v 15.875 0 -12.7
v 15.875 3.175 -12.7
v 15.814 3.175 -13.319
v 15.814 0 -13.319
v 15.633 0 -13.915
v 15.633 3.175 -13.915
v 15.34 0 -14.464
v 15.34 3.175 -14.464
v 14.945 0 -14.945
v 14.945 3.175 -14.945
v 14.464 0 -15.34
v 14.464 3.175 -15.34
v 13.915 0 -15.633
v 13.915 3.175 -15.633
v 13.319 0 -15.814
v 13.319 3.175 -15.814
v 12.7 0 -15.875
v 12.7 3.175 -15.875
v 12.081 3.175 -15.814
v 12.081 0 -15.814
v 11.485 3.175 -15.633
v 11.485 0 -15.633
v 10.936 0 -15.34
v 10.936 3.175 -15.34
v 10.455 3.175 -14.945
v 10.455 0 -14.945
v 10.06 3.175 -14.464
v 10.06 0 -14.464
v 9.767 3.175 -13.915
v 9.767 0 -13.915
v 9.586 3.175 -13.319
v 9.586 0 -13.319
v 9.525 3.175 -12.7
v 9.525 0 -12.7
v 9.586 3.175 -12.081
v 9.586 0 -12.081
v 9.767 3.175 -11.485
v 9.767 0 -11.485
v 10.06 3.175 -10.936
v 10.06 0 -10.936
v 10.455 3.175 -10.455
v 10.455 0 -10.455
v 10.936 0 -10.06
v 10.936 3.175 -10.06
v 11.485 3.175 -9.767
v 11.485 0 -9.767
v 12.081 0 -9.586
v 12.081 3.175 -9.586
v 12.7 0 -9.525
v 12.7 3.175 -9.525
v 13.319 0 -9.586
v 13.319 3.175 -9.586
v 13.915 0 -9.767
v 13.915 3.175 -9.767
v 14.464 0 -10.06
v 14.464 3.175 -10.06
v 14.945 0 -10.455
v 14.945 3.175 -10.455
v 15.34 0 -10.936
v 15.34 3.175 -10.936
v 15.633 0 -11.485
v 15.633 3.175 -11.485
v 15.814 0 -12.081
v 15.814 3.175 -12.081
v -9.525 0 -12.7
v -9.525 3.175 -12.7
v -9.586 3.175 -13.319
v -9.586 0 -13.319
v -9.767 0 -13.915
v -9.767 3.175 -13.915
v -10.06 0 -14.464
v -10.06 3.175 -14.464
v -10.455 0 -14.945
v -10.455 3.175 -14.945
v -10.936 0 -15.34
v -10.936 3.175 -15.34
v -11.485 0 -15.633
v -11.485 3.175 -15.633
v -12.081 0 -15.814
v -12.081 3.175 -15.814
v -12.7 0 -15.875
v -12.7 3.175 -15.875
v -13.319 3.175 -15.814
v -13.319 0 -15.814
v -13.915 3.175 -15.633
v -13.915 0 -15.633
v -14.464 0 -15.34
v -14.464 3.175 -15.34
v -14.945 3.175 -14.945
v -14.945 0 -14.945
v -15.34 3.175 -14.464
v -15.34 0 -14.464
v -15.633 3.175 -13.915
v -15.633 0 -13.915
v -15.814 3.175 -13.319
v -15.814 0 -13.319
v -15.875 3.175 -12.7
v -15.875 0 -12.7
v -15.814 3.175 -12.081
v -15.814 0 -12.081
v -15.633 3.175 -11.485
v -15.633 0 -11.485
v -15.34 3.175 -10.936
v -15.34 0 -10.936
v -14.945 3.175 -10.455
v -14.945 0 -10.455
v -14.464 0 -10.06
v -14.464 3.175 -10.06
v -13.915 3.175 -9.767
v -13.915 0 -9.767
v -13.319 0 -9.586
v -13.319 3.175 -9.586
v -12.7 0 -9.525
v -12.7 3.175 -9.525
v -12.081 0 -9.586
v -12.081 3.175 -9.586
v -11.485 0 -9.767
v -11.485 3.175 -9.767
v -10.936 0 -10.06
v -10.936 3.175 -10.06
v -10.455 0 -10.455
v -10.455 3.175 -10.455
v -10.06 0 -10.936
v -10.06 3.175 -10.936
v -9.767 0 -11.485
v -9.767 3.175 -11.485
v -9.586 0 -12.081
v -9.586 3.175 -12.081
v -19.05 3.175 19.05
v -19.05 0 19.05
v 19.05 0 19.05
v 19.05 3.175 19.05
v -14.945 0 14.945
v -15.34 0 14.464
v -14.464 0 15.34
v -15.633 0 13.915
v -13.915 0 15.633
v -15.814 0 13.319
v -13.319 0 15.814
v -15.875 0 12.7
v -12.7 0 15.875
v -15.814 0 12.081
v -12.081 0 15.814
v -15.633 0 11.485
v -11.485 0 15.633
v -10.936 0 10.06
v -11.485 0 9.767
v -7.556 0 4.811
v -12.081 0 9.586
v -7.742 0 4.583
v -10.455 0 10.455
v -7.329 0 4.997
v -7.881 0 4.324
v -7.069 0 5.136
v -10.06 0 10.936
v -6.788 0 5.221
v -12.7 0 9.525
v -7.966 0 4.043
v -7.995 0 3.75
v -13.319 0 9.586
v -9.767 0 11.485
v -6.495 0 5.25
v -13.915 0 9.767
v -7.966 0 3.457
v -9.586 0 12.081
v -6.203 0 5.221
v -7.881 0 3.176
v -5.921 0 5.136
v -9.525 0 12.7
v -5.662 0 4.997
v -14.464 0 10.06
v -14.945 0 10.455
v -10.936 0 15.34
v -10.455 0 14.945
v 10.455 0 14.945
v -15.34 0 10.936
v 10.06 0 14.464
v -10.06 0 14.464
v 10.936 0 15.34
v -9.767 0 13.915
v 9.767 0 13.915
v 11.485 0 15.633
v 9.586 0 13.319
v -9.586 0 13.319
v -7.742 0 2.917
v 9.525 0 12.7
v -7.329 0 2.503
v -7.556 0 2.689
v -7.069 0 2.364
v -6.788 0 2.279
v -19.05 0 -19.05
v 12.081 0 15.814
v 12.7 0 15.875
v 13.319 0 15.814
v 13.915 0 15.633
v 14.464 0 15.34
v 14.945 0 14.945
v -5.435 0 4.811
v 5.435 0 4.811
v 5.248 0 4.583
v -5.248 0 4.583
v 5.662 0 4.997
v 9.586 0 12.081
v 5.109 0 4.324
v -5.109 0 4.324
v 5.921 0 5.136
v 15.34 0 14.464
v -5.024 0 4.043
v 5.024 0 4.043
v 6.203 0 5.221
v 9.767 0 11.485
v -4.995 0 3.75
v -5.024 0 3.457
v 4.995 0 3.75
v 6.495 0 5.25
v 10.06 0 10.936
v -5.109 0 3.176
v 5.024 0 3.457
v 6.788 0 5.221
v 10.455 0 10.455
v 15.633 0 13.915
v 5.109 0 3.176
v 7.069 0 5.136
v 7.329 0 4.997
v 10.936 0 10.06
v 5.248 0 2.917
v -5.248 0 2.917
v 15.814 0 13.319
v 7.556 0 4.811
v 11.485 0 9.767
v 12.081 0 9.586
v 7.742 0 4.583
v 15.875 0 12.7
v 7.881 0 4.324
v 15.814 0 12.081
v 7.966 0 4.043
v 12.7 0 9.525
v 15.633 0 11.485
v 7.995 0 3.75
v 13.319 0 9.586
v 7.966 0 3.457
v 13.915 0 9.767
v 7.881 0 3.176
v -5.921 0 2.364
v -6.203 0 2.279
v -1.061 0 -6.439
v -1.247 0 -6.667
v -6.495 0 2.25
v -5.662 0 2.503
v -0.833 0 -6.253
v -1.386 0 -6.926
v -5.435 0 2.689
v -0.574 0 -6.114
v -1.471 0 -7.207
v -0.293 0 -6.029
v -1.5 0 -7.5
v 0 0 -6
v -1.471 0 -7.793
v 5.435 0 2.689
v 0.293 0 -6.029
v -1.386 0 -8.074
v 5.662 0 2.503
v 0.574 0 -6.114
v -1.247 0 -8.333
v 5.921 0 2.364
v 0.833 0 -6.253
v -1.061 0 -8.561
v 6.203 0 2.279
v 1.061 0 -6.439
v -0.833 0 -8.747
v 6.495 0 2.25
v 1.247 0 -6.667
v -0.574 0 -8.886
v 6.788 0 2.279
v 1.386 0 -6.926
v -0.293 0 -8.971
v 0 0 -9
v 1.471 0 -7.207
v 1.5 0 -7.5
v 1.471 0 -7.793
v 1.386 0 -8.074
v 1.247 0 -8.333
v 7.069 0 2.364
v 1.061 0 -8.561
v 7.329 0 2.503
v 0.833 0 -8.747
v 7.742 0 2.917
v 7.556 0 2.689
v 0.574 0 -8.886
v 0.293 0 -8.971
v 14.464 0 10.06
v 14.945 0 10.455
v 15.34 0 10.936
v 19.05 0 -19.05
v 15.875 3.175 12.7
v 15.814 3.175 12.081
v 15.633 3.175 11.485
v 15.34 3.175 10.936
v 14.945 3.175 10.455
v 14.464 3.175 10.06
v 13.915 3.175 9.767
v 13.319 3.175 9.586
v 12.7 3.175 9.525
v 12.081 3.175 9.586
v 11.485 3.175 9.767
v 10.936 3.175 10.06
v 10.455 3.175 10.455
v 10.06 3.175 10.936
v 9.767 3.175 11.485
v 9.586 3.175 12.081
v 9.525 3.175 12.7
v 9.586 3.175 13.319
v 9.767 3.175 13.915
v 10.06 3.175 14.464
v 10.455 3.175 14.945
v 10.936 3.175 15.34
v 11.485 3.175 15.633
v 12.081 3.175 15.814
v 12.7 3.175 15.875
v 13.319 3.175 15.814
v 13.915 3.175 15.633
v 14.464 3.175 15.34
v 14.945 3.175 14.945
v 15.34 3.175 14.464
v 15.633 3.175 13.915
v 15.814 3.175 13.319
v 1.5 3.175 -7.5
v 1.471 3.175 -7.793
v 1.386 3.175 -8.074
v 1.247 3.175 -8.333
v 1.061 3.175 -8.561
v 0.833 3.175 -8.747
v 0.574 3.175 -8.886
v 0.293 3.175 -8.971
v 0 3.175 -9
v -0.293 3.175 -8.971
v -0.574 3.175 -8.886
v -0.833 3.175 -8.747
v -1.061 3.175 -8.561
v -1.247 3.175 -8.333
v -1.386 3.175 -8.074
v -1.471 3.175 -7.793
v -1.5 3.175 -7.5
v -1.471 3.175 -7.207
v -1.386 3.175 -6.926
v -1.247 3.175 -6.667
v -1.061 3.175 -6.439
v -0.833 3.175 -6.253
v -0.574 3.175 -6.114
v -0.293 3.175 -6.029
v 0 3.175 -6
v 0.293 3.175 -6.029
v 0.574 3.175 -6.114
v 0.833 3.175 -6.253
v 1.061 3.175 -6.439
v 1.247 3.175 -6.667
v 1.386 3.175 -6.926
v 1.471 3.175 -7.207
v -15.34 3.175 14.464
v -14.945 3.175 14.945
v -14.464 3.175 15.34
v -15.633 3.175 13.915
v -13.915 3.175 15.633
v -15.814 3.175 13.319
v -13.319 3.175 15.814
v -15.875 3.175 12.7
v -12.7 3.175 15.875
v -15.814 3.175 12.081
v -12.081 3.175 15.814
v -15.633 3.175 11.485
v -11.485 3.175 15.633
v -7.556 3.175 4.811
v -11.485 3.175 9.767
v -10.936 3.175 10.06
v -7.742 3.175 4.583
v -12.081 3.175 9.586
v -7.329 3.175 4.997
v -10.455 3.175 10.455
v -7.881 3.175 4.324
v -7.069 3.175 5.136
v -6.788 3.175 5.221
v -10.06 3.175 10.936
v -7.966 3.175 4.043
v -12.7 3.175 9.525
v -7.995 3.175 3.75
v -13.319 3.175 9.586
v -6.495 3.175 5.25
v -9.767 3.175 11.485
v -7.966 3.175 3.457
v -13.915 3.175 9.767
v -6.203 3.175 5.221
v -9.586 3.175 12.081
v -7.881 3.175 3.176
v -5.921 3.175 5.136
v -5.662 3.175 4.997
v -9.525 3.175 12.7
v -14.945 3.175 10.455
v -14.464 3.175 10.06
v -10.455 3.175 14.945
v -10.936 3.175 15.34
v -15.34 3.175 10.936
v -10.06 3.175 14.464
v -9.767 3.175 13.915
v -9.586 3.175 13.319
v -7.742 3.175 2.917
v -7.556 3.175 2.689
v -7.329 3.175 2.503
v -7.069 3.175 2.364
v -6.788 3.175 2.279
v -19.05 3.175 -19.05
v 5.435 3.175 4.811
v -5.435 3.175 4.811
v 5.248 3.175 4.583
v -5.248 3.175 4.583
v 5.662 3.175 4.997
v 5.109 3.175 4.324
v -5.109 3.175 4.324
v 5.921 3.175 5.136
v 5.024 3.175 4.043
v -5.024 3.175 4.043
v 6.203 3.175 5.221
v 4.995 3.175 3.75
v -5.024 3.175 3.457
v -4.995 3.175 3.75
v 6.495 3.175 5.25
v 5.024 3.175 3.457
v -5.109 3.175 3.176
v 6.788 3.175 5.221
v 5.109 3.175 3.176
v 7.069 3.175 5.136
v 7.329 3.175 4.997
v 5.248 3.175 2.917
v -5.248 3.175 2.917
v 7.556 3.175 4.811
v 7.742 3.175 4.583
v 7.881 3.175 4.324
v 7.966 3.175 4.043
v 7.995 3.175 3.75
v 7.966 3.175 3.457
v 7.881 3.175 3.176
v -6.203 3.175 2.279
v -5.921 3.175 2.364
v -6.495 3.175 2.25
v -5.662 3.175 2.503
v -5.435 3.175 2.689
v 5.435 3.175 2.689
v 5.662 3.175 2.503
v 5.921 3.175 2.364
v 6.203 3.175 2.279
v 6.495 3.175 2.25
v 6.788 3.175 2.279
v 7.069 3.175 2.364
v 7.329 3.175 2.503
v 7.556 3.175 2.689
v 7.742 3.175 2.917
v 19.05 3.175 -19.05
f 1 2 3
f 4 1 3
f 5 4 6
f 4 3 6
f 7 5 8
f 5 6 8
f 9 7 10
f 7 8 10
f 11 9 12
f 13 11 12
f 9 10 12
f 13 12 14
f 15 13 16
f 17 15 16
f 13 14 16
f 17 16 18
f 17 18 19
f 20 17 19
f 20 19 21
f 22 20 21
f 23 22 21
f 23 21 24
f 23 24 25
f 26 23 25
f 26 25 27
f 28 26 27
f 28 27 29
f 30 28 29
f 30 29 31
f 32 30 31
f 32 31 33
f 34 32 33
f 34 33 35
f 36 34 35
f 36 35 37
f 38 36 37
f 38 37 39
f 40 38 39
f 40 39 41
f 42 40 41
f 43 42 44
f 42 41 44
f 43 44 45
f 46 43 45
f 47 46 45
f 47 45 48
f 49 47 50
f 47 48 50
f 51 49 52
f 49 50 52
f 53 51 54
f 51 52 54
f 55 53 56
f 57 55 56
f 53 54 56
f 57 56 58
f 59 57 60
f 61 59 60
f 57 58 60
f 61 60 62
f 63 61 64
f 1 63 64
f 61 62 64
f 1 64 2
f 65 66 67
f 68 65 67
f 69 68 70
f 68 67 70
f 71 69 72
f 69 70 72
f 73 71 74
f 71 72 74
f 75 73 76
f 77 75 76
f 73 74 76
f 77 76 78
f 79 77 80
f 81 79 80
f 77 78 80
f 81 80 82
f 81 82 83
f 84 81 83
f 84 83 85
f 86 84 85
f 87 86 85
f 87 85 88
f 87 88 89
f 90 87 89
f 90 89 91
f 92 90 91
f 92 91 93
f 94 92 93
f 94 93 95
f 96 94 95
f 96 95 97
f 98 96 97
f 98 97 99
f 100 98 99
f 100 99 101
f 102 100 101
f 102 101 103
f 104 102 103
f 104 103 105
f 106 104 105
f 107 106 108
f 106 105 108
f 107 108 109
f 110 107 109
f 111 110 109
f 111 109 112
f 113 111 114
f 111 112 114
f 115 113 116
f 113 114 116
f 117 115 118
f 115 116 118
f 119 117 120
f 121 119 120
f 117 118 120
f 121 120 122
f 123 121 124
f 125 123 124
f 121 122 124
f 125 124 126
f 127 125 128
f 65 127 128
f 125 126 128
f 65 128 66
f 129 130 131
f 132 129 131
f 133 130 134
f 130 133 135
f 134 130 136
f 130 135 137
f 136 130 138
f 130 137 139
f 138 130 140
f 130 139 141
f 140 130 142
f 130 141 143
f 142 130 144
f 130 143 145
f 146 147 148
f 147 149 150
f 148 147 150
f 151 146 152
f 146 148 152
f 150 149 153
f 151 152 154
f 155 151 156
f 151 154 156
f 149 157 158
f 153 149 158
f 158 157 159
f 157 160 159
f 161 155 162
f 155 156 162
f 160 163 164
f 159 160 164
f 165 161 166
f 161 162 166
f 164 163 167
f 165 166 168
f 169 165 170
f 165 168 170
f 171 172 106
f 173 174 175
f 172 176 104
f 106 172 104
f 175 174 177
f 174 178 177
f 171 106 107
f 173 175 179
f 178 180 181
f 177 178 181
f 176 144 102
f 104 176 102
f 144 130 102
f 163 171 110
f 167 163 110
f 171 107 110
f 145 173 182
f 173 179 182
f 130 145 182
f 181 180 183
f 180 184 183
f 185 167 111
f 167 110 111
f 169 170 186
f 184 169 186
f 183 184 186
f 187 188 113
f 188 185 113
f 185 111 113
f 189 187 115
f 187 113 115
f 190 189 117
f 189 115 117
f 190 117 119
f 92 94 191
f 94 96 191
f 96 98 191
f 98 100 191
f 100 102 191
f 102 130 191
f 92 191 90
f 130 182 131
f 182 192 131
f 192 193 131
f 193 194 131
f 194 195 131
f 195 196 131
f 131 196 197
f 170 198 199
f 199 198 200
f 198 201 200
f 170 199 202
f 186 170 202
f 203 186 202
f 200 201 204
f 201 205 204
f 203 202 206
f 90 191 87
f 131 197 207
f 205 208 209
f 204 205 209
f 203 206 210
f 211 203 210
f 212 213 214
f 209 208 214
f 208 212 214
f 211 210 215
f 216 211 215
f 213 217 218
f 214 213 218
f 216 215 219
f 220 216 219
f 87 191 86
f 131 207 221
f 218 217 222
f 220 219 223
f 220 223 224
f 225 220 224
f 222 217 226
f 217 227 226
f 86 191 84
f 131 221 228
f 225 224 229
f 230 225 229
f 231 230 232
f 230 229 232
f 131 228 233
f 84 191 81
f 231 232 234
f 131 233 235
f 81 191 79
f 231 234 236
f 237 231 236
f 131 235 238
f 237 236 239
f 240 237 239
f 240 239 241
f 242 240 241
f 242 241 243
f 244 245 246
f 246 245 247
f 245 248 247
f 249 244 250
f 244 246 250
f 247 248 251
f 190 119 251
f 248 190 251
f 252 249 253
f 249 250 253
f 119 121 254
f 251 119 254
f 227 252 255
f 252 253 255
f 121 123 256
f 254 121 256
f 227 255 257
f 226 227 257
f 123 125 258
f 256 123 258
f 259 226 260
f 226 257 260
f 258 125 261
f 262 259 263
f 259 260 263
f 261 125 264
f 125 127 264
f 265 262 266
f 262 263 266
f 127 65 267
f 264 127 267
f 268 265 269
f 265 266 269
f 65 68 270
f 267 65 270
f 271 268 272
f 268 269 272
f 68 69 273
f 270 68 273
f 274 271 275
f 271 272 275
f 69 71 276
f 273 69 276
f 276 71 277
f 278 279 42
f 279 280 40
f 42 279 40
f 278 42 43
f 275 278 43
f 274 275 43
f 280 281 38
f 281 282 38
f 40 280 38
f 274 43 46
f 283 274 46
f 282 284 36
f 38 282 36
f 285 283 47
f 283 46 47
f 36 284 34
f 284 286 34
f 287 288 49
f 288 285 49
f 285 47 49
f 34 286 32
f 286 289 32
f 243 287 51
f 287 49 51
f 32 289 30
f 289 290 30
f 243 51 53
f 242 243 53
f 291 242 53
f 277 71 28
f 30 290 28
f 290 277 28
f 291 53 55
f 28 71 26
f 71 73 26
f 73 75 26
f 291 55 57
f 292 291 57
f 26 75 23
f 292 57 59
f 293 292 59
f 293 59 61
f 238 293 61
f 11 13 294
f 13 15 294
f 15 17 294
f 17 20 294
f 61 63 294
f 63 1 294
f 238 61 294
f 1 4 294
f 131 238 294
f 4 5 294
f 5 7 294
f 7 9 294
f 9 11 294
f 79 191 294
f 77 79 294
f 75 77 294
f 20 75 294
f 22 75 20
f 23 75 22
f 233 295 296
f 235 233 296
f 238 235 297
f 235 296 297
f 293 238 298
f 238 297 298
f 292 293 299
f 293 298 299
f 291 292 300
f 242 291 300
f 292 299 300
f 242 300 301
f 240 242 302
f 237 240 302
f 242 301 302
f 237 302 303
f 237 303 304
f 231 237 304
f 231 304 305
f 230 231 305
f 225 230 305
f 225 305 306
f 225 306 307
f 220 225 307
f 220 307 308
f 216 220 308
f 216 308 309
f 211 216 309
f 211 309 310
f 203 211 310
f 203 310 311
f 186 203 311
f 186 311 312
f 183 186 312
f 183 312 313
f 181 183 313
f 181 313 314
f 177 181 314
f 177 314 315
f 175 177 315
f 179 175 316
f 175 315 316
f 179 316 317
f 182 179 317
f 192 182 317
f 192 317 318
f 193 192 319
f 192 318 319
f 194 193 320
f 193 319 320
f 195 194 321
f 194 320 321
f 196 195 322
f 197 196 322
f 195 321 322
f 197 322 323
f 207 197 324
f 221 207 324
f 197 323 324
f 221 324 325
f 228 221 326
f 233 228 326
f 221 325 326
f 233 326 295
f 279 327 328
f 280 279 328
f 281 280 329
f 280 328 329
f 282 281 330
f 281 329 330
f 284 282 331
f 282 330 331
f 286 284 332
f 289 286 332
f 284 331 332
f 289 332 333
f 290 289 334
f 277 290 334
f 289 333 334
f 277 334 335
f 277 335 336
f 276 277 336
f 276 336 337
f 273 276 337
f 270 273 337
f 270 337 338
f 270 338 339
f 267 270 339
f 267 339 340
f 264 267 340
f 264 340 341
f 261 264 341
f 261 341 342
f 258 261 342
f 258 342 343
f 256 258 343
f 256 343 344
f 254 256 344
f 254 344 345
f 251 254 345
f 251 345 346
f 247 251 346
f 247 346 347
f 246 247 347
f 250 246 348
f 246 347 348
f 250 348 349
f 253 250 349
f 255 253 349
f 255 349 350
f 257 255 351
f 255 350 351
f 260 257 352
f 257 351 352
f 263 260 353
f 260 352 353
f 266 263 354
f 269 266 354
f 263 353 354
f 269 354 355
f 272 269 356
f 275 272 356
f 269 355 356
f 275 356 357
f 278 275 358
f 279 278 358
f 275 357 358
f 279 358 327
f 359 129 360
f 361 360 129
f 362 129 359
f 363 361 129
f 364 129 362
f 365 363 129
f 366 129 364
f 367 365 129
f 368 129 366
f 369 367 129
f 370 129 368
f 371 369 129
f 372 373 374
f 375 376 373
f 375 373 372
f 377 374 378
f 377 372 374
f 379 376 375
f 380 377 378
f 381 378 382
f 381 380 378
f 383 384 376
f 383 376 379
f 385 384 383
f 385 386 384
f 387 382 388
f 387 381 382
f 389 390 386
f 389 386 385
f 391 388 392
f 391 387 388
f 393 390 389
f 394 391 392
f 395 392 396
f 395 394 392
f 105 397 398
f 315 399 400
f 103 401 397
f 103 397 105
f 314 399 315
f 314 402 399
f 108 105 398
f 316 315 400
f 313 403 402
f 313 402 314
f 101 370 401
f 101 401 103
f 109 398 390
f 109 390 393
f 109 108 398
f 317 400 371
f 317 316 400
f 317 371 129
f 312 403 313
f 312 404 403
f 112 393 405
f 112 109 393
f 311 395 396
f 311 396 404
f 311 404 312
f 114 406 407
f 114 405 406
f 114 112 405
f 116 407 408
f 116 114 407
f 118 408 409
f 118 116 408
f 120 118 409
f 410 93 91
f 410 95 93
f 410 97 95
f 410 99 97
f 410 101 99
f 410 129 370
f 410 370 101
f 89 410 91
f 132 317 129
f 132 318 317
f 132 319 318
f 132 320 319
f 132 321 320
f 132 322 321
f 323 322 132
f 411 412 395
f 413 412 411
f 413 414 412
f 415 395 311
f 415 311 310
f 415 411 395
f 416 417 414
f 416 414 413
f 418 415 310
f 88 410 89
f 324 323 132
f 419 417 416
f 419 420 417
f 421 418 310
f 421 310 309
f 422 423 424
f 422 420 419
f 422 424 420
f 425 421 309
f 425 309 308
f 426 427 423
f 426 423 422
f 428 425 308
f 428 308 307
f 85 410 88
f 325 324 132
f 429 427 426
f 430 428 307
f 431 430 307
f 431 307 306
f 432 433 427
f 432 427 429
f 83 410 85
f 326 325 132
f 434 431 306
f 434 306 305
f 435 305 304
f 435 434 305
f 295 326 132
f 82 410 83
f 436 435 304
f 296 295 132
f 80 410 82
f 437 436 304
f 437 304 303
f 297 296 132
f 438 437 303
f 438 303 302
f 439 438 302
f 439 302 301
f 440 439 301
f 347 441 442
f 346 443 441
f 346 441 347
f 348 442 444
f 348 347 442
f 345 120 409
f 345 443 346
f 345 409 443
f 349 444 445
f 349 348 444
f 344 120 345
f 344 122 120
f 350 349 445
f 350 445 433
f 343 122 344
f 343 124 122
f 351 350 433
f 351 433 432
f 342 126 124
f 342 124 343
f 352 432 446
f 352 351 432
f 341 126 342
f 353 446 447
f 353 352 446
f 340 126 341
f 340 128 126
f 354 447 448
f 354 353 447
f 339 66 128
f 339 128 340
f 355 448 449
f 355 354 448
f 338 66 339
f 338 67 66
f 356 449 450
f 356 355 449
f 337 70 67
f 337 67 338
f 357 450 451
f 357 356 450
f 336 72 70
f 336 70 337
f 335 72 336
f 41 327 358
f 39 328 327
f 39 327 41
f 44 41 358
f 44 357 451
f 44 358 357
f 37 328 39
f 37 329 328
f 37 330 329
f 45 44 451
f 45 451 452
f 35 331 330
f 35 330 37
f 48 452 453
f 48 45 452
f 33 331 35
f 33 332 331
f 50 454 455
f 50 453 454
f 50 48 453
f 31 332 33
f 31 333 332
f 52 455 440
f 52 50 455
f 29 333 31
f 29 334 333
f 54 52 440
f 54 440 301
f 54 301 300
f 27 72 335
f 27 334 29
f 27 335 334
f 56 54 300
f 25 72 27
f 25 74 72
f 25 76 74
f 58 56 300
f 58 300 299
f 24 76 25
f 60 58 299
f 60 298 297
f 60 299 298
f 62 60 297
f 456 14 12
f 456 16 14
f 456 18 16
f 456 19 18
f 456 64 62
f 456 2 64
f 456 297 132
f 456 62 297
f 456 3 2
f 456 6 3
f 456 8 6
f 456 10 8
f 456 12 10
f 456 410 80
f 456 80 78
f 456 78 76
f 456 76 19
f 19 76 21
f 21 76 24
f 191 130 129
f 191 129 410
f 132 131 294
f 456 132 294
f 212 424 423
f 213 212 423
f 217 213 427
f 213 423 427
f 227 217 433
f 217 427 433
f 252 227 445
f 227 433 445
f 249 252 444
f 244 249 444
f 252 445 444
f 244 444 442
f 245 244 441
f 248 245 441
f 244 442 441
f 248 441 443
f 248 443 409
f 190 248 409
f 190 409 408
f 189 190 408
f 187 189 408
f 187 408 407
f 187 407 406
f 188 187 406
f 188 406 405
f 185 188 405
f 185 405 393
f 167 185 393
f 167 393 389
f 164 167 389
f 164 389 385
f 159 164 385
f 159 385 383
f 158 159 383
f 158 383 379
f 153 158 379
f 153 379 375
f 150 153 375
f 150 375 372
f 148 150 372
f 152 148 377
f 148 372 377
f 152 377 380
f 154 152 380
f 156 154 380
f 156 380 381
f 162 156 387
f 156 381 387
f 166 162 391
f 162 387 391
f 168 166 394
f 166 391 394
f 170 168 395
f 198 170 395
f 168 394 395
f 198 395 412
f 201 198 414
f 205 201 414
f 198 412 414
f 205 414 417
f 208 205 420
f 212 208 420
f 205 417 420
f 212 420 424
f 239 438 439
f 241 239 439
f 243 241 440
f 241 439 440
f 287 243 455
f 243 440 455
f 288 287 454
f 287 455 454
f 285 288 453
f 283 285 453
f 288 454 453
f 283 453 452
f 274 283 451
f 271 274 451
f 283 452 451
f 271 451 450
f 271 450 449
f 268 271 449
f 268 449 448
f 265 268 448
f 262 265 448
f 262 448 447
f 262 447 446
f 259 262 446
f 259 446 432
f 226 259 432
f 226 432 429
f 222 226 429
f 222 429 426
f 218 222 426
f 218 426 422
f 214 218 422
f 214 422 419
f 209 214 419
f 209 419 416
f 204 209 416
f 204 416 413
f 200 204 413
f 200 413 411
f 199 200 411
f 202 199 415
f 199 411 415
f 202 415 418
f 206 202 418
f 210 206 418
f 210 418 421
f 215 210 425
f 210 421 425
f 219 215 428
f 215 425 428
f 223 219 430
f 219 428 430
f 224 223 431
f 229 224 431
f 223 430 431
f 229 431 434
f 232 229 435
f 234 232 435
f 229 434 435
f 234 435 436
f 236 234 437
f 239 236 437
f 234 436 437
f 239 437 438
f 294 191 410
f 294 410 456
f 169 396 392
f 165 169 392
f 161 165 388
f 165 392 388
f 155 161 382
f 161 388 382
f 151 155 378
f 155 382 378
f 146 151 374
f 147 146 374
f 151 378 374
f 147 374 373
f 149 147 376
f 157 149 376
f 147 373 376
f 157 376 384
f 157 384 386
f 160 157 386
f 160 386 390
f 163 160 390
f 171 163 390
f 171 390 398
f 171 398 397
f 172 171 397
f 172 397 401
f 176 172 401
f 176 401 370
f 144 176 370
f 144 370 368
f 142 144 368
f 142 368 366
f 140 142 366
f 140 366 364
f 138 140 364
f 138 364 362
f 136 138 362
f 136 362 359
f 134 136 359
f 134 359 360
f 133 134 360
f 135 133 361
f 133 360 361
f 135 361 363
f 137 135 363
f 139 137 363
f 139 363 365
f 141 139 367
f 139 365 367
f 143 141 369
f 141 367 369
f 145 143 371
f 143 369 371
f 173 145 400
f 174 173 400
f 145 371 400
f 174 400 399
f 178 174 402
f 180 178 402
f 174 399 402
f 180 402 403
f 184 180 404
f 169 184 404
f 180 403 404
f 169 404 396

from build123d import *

# Parameters (mm, degrees)
SKETCH1_W           = 38.1
SKETCH1_H           = 38.1
BOSS_EXTRUDE1_DEPTH = 3.175
SKETCH2_R           = 1.5
CUT_EXTRUDE1_DEPTH  = 4.175
SKETCH3_R           = 3.175
CUT_EXTRUDE2_DEPTH  = 4.175


with BuildPart() as part:
    # Sketch1 → Boss-Extrude1 (new body)
    with BuildSketch(Plane(origin=(0, 0, 0), x_dir=(1, 0, 0), z_dir=(0, 1, 0))):
        Rectangle(SKETCH1_W, SKETCH1_H)
    extrude(amount=BOSS_EXTRUDE1_DEPTH)

    # Sketch2 → Cut-Extrude1 (cut, through all)
    with BuildSketch(Plane(origin=(0, 3.175, 0), x_dir=(1, 0, 0), z_dir=(0, 1, 0))):
        with Locations((0, 7.5)):
            Circle(SKETCH2_R)
        with Locations((6.495190528, -3.75)):
            Circle(SKETCH2_R)
        with Locations((-6.495190528, -3.75)):
            Circle(SKETCH2_R)
    extrude(amount=-CUT_EXTRUDE1_DEPTH, mode=Mode.SUBTRACT)

    # Sketch3 → Cut-Extrude2 (cut, through all)
    with BuildSketch(Plane(origin=(0, 3.175, 0), x_dir=(1, 0, 0), z_dir=(0, 1, 0))):
        with Locations((-12.7, 12.7)):
            Circle(SKETCH3_R)
        with Locations((-12.7, -12.7)):
            Circle(SKETCH3_R)
        with Locations((12.7, -12.7)):
            Circle(SKETCH3_R)
        with Locations((12.7, 12.7)):
            Circle(SKETCH3_R)
    extrude(amount=-CUT_EXTRUDE2_DEPTH, mode=Mode.SUBTRACT)


solid = part.part
